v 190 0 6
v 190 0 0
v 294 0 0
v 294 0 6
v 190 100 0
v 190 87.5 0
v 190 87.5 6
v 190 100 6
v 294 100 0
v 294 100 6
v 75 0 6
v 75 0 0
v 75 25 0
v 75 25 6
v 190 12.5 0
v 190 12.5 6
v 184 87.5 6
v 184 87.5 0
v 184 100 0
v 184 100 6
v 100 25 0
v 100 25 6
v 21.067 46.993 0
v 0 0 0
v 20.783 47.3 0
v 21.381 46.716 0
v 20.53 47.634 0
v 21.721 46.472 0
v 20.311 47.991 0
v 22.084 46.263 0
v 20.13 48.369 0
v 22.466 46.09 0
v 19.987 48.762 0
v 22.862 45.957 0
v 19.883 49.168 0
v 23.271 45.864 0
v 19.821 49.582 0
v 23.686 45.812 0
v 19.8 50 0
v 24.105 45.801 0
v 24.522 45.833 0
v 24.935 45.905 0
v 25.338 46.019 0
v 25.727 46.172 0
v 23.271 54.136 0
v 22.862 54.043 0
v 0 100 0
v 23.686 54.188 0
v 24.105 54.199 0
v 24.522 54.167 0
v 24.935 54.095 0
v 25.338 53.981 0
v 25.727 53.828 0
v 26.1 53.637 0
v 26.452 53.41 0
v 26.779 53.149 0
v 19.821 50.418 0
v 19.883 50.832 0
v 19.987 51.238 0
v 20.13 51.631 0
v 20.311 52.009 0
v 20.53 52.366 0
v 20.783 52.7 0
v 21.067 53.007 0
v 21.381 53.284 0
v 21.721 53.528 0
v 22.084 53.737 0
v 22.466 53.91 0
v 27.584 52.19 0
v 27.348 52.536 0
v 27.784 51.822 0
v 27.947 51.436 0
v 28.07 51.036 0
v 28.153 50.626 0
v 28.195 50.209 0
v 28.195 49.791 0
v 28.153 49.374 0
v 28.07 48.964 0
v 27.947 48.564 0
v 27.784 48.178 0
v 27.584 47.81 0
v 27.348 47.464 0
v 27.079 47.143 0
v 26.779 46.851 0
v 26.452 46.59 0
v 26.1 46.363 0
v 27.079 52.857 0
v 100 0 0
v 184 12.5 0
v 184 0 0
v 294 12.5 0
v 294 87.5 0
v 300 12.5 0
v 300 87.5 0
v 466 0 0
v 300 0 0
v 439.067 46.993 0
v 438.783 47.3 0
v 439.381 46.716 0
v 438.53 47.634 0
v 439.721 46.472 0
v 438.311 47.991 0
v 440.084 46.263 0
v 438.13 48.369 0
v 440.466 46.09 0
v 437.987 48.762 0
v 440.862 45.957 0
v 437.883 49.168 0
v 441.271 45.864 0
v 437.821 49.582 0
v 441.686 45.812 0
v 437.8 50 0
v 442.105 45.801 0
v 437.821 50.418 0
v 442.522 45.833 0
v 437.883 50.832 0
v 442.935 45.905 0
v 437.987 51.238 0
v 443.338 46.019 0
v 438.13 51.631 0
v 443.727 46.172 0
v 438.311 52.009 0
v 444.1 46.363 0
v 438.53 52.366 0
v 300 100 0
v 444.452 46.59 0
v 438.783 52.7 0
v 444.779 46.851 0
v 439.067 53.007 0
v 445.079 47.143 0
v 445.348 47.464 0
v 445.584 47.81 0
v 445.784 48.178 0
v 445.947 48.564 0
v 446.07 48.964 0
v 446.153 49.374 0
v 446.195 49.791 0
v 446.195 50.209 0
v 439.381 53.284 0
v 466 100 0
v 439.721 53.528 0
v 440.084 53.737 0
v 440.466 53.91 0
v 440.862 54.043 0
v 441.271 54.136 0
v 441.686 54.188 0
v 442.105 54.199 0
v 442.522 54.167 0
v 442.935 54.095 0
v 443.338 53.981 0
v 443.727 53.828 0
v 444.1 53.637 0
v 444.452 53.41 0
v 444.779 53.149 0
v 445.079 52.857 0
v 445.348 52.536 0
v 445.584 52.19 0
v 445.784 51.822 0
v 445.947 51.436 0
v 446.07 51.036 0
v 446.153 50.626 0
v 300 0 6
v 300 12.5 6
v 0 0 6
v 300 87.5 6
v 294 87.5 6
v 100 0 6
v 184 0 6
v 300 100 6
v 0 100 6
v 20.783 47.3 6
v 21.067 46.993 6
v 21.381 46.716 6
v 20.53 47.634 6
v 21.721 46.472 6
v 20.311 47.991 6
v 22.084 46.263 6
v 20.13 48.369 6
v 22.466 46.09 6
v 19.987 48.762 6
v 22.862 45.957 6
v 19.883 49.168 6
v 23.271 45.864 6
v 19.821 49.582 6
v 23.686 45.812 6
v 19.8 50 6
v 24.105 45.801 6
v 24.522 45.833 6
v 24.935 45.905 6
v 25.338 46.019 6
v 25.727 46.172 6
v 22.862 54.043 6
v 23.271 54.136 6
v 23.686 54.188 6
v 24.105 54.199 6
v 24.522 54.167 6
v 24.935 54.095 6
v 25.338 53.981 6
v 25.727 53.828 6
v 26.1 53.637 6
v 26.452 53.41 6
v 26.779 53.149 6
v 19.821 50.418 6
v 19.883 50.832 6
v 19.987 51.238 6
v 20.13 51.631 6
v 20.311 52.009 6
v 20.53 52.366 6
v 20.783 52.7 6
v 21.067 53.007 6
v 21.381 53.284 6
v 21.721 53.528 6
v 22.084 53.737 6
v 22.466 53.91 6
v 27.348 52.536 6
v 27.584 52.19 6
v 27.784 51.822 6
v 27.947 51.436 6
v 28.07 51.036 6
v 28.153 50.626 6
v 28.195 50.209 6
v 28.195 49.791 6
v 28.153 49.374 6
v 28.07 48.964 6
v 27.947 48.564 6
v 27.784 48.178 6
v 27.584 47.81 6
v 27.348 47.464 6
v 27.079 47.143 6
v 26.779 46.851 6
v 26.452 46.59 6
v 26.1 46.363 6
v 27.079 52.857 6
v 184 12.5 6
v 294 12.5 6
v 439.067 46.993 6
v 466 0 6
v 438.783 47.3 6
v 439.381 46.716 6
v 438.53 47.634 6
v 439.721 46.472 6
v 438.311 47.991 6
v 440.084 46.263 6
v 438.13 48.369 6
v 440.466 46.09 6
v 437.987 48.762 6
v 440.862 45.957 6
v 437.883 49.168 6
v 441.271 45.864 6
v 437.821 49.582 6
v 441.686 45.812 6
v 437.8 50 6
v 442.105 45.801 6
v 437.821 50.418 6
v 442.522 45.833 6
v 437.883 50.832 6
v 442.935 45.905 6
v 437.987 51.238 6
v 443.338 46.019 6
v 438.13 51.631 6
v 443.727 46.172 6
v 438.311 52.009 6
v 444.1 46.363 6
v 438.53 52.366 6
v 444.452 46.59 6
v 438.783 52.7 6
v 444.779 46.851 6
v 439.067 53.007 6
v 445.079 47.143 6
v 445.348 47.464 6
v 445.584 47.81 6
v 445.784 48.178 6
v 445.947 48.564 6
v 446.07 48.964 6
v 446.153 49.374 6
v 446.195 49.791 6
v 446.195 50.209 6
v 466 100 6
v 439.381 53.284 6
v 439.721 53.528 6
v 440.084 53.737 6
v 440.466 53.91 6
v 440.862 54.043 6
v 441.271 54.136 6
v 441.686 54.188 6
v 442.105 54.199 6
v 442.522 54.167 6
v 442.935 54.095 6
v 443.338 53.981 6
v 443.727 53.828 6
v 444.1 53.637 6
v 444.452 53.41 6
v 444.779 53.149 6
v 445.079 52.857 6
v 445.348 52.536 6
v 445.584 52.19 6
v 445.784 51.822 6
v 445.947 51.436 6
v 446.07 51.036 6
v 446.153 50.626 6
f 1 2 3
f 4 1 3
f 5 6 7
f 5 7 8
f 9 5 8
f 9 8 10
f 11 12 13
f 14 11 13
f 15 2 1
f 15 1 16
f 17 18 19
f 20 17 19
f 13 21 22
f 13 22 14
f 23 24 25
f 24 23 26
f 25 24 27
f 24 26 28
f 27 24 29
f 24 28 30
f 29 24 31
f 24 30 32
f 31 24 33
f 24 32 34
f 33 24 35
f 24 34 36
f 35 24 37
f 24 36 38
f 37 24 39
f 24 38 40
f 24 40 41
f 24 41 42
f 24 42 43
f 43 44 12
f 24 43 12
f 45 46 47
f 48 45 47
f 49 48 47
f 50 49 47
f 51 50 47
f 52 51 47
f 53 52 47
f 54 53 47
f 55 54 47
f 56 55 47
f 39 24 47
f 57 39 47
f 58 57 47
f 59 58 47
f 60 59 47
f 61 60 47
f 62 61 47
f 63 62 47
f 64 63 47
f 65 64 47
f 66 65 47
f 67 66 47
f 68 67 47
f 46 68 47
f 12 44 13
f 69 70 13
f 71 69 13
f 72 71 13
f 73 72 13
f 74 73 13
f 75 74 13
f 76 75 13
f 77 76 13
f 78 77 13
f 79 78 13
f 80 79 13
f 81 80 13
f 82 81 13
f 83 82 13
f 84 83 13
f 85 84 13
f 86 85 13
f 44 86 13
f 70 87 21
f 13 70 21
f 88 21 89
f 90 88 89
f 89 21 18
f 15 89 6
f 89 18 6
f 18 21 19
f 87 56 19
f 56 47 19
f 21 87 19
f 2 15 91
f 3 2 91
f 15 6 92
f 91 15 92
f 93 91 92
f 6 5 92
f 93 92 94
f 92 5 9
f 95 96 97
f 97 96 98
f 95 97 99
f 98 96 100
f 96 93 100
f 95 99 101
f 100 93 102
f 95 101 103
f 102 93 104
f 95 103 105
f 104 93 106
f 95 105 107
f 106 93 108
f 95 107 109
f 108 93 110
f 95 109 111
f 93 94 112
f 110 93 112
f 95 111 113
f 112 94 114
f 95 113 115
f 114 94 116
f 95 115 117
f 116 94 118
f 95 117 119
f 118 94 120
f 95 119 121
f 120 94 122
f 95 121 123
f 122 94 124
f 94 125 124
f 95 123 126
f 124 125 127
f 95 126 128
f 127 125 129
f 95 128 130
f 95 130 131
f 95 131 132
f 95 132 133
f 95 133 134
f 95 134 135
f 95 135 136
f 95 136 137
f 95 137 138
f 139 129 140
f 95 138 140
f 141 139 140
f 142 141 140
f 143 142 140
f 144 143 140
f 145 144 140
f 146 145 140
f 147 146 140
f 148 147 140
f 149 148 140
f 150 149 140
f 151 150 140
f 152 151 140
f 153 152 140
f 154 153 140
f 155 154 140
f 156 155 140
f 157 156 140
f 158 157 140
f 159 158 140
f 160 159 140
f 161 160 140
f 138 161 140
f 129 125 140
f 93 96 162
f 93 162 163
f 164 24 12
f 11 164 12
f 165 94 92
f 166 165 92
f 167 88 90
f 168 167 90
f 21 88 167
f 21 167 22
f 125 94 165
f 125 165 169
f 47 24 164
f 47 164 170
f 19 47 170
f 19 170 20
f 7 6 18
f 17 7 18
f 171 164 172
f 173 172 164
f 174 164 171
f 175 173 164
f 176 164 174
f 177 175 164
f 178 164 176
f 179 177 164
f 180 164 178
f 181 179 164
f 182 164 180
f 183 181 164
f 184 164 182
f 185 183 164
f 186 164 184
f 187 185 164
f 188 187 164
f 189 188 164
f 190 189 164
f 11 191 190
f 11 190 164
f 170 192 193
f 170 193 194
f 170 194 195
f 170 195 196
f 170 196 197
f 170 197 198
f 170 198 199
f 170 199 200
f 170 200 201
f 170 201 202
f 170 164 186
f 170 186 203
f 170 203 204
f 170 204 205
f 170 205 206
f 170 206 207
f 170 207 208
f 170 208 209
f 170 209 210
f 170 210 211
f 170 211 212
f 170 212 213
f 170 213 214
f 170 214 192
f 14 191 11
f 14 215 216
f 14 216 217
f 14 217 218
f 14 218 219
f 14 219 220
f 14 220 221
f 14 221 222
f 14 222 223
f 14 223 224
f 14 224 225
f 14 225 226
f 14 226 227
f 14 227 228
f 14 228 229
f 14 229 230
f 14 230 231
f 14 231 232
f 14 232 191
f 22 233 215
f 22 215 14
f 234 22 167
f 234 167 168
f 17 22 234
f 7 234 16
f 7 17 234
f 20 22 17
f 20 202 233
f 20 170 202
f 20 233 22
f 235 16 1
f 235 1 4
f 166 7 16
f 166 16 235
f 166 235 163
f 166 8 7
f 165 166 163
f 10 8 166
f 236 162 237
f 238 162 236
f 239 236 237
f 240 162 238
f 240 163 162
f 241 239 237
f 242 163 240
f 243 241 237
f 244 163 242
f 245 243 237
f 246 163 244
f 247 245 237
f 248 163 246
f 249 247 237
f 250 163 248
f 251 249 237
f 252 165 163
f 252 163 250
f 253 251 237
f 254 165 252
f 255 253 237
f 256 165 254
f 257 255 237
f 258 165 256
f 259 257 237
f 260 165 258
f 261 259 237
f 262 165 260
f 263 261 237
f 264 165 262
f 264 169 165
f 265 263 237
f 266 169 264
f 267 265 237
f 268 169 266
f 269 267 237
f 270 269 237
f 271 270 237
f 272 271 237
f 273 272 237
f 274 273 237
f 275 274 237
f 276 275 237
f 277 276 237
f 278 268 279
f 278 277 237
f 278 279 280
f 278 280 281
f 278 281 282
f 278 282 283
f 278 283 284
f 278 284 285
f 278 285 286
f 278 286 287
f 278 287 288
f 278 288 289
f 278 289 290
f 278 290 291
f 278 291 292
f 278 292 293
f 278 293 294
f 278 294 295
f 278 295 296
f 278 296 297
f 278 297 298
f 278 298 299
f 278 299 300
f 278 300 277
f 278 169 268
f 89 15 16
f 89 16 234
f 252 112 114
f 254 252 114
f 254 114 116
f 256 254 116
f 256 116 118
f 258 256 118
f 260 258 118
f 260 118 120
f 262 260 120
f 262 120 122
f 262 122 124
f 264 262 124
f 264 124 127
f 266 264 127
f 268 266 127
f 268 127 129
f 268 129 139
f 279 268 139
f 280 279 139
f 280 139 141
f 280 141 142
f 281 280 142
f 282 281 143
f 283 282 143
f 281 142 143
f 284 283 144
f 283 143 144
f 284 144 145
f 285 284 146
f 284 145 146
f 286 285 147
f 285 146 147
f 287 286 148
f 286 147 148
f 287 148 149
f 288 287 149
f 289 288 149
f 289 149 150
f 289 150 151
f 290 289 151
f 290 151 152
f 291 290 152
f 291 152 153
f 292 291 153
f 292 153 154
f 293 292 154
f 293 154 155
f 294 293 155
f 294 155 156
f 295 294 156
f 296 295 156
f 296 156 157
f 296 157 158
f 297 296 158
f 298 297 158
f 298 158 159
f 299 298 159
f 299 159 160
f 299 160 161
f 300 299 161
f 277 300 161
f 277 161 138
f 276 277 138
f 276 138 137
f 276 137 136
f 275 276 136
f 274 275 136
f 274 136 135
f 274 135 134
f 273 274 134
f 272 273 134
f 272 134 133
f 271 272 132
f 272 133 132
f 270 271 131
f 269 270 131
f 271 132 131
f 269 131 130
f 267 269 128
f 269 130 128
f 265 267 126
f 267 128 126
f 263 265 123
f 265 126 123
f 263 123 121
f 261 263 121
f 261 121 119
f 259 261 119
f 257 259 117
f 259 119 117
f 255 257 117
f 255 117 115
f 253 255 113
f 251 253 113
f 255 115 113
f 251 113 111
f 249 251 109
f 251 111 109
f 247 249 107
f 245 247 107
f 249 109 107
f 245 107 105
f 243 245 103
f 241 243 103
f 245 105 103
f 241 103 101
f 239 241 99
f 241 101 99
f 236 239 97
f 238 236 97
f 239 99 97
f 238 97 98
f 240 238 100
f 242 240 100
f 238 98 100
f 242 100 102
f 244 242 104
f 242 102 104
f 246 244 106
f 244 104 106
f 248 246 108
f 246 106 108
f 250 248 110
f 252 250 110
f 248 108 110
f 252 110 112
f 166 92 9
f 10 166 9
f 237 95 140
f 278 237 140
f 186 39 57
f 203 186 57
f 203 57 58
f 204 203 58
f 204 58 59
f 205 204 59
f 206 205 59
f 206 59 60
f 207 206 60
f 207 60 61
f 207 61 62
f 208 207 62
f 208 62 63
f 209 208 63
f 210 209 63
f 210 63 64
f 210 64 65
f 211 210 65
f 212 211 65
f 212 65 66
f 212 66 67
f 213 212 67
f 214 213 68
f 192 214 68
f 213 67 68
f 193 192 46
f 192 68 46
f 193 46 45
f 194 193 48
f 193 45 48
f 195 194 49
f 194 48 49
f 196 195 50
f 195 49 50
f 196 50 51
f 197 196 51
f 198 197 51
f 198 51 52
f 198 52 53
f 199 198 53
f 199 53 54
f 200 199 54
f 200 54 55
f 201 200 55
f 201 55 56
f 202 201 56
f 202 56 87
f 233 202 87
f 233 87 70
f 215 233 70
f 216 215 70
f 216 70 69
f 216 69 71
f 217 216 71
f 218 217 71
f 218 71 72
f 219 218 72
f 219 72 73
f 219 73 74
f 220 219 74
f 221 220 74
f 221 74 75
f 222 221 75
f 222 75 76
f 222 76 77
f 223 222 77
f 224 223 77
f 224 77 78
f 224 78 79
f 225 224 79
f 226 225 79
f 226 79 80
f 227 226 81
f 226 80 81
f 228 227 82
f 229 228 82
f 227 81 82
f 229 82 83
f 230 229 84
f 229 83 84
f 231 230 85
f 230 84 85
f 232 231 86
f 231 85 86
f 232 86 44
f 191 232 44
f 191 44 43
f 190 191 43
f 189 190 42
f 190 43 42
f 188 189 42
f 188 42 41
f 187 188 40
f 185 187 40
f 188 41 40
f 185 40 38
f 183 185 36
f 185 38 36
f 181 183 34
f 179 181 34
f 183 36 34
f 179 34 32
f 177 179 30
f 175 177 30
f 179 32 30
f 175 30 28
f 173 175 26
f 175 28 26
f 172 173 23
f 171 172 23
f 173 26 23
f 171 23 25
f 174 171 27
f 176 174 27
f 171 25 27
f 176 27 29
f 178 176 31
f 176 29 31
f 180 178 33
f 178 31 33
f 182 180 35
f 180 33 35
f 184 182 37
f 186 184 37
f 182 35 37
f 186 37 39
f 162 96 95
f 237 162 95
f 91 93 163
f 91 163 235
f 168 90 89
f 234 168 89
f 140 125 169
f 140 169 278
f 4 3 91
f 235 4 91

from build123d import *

# Parameters (mm, degrees)
SKETCH1_W            = 466
SKETCH1_H            = 100
BOSS_EXTRUDE1_DEPTH  = 6
M8_CLEARANCE_SLOT1_D = 8.4
SKETCH4_W            = 25
SKETCH4_H            = 25
CUT_EXTRUDE1_DEPTH   = 12
SKETCH5_W            = 6
SKETCH5_H            = 12.5
CUT_EXTRUDE2_DEPTH   = 477.646619625


with BuildPart() as part:
    # Sketch1 → Boss-Extrude1 (new body)
    with BuildSketch(Plane.XY):
        with Locations((233, 50)):
            Rectangle(SKETCH1_W, SKETCH1_H)
    extrude(amount=BOSS_EXTRUDE1_DEPTH)

    # M8 Clearance Slot1 (through all)
    with Locations(Plane.XY.offset(6)):
        with Locations((24, 50), (442, 50)):
            Hole(M8_CLEARANCE_SLOT1_D / 2)

    # Sketch4 → Cut-Extrude1 (cut)
    with BuildSketch(Plane(origin=(0, 0, 0), x_dir=(-1, 0, 0), z_dir=(0, 0, -1))):
        with Locations((-87.5, 12.5)):
            Rectangle(SKETCH4_W, SKETCH4_H)
    extrude(amount=-CUT_EXTRUDE1_DEPTH, mode=Mode.SUBTRACT)

    # Sketch5 → Cut-Extrude2 (cut, through all)
    with BuildSketch(Plane(origin=(0, 0, 0), x_dir=(-1, 0, 0), z_dir=(0, 0, -1))):
        with Locations((-297, 93.75)):
            Rectangle(SKETCH5_W, SKETCH5_H)
        with Locations((-187, 93.75)):
            Rectangle(SKETCH5_W, SKETCH5_H)
        with Locations((-297, 6.25)):
            Rectangle(SKETCH5_W, SKETCH5_H)
        with Locations((-187, 6.25)):
            Rectangle(SKETCH5_W, SKETCH5_H)
    extrude(amount=-CUT_EXTRUDE2_DEPTH, mode=Mode.SUBTRACT)


solid = part.part
